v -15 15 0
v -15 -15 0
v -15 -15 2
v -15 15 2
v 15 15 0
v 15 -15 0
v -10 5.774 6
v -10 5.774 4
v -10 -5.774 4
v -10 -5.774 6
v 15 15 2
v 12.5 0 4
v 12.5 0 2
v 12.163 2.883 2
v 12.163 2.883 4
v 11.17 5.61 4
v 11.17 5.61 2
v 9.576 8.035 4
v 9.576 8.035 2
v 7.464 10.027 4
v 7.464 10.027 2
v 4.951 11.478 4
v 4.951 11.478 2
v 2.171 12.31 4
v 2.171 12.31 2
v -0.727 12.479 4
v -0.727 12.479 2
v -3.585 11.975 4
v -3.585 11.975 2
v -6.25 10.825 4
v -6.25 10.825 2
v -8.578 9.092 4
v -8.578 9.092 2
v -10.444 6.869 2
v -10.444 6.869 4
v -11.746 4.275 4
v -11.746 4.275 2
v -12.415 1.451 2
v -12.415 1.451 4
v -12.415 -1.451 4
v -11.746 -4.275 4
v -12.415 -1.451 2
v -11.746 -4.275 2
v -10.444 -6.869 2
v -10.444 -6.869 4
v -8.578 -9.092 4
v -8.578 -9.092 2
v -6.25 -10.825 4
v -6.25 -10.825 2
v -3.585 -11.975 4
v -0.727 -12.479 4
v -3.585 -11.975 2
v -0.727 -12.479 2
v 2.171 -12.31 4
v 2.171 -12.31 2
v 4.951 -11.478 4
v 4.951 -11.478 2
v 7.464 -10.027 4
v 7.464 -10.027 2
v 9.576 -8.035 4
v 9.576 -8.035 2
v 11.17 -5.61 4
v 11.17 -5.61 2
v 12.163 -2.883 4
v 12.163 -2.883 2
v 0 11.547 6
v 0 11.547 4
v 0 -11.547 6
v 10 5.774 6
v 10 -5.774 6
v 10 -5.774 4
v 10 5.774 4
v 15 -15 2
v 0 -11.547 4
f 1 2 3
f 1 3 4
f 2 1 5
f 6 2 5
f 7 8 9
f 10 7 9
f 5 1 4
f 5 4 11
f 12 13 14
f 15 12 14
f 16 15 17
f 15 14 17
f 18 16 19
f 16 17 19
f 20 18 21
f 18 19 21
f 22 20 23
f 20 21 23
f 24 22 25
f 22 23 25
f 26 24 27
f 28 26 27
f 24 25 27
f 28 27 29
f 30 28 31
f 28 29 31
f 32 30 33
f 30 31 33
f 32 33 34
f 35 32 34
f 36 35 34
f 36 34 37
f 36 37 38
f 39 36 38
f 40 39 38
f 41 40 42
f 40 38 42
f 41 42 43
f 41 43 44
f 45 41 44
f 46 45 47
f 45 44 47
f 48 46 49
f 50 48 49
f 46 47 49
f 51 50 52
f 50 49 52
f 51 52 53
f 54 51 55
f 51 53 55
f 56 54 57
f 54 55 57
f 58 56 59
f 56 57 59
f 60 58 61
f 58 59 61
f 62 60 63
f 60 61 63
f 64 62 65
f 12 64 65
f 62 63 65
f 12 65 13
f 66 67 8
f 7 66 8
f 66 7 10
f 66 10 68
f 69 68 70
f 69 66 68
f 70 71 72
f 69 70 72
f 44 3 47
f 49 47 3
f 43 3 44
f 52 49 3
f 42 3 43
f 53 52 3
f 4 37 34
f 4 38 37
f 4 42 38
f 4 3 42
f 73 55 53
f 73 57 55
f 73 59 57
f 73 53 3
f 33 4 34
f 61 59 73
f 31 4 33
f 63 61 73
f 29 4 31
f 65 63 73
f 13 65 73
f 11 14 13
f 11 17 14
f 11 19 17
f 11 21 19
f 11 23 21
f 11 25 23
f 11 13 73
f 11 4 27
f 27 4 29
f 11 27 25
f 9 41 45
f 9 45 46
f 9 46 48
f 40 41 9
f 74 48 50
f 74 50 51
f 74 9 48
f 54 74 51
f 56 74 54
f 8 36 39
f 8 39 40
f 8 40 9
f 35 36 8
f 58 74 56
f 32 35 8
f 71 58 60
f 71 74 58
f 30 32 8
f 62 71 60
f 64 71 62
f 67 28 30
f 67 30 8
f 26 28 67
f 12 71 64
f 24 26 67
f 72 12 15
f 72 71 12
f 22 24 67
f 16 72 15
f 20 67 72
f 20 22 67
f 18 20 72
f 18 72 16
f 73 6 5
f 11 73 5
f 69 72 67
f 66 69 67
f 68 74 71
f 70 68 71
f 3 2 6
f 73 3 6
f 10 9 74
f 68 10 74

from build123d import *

# Parameters (mm, degrees)
F0_W     = 30
F0_H     = 30
F1_DEPTH = 2
F2_R     = 12.5
F3_DEPTH = 2
F5_DEPTH = 2


with BuildPart() as f1:
    # F0 (on Top) → F1 (new body)
    with BuildSketch(Plane.XY):
        Rectangle(F0_W, F0_H)
    extrude(amount=F1_DEPTH)

    # F2 (on face) → F3 (join)
    with BuildSketch(Plane.XY.offset(2)):
        Circle(F2_R)
    extrude(amount=F3_DEPTH)

    # F4 (on face) → F5 (join)
    with BuildSketch(Plane.XY.offset(4)):
        Polygon((0, 11.547005), (-10, 5.773503), (-10, -5.773503), (0, -11.547005), (10, -5.773503), (10, 5.773503), align=None)
    extrude(amount=F5_DEPTH)


solid = f1.part
